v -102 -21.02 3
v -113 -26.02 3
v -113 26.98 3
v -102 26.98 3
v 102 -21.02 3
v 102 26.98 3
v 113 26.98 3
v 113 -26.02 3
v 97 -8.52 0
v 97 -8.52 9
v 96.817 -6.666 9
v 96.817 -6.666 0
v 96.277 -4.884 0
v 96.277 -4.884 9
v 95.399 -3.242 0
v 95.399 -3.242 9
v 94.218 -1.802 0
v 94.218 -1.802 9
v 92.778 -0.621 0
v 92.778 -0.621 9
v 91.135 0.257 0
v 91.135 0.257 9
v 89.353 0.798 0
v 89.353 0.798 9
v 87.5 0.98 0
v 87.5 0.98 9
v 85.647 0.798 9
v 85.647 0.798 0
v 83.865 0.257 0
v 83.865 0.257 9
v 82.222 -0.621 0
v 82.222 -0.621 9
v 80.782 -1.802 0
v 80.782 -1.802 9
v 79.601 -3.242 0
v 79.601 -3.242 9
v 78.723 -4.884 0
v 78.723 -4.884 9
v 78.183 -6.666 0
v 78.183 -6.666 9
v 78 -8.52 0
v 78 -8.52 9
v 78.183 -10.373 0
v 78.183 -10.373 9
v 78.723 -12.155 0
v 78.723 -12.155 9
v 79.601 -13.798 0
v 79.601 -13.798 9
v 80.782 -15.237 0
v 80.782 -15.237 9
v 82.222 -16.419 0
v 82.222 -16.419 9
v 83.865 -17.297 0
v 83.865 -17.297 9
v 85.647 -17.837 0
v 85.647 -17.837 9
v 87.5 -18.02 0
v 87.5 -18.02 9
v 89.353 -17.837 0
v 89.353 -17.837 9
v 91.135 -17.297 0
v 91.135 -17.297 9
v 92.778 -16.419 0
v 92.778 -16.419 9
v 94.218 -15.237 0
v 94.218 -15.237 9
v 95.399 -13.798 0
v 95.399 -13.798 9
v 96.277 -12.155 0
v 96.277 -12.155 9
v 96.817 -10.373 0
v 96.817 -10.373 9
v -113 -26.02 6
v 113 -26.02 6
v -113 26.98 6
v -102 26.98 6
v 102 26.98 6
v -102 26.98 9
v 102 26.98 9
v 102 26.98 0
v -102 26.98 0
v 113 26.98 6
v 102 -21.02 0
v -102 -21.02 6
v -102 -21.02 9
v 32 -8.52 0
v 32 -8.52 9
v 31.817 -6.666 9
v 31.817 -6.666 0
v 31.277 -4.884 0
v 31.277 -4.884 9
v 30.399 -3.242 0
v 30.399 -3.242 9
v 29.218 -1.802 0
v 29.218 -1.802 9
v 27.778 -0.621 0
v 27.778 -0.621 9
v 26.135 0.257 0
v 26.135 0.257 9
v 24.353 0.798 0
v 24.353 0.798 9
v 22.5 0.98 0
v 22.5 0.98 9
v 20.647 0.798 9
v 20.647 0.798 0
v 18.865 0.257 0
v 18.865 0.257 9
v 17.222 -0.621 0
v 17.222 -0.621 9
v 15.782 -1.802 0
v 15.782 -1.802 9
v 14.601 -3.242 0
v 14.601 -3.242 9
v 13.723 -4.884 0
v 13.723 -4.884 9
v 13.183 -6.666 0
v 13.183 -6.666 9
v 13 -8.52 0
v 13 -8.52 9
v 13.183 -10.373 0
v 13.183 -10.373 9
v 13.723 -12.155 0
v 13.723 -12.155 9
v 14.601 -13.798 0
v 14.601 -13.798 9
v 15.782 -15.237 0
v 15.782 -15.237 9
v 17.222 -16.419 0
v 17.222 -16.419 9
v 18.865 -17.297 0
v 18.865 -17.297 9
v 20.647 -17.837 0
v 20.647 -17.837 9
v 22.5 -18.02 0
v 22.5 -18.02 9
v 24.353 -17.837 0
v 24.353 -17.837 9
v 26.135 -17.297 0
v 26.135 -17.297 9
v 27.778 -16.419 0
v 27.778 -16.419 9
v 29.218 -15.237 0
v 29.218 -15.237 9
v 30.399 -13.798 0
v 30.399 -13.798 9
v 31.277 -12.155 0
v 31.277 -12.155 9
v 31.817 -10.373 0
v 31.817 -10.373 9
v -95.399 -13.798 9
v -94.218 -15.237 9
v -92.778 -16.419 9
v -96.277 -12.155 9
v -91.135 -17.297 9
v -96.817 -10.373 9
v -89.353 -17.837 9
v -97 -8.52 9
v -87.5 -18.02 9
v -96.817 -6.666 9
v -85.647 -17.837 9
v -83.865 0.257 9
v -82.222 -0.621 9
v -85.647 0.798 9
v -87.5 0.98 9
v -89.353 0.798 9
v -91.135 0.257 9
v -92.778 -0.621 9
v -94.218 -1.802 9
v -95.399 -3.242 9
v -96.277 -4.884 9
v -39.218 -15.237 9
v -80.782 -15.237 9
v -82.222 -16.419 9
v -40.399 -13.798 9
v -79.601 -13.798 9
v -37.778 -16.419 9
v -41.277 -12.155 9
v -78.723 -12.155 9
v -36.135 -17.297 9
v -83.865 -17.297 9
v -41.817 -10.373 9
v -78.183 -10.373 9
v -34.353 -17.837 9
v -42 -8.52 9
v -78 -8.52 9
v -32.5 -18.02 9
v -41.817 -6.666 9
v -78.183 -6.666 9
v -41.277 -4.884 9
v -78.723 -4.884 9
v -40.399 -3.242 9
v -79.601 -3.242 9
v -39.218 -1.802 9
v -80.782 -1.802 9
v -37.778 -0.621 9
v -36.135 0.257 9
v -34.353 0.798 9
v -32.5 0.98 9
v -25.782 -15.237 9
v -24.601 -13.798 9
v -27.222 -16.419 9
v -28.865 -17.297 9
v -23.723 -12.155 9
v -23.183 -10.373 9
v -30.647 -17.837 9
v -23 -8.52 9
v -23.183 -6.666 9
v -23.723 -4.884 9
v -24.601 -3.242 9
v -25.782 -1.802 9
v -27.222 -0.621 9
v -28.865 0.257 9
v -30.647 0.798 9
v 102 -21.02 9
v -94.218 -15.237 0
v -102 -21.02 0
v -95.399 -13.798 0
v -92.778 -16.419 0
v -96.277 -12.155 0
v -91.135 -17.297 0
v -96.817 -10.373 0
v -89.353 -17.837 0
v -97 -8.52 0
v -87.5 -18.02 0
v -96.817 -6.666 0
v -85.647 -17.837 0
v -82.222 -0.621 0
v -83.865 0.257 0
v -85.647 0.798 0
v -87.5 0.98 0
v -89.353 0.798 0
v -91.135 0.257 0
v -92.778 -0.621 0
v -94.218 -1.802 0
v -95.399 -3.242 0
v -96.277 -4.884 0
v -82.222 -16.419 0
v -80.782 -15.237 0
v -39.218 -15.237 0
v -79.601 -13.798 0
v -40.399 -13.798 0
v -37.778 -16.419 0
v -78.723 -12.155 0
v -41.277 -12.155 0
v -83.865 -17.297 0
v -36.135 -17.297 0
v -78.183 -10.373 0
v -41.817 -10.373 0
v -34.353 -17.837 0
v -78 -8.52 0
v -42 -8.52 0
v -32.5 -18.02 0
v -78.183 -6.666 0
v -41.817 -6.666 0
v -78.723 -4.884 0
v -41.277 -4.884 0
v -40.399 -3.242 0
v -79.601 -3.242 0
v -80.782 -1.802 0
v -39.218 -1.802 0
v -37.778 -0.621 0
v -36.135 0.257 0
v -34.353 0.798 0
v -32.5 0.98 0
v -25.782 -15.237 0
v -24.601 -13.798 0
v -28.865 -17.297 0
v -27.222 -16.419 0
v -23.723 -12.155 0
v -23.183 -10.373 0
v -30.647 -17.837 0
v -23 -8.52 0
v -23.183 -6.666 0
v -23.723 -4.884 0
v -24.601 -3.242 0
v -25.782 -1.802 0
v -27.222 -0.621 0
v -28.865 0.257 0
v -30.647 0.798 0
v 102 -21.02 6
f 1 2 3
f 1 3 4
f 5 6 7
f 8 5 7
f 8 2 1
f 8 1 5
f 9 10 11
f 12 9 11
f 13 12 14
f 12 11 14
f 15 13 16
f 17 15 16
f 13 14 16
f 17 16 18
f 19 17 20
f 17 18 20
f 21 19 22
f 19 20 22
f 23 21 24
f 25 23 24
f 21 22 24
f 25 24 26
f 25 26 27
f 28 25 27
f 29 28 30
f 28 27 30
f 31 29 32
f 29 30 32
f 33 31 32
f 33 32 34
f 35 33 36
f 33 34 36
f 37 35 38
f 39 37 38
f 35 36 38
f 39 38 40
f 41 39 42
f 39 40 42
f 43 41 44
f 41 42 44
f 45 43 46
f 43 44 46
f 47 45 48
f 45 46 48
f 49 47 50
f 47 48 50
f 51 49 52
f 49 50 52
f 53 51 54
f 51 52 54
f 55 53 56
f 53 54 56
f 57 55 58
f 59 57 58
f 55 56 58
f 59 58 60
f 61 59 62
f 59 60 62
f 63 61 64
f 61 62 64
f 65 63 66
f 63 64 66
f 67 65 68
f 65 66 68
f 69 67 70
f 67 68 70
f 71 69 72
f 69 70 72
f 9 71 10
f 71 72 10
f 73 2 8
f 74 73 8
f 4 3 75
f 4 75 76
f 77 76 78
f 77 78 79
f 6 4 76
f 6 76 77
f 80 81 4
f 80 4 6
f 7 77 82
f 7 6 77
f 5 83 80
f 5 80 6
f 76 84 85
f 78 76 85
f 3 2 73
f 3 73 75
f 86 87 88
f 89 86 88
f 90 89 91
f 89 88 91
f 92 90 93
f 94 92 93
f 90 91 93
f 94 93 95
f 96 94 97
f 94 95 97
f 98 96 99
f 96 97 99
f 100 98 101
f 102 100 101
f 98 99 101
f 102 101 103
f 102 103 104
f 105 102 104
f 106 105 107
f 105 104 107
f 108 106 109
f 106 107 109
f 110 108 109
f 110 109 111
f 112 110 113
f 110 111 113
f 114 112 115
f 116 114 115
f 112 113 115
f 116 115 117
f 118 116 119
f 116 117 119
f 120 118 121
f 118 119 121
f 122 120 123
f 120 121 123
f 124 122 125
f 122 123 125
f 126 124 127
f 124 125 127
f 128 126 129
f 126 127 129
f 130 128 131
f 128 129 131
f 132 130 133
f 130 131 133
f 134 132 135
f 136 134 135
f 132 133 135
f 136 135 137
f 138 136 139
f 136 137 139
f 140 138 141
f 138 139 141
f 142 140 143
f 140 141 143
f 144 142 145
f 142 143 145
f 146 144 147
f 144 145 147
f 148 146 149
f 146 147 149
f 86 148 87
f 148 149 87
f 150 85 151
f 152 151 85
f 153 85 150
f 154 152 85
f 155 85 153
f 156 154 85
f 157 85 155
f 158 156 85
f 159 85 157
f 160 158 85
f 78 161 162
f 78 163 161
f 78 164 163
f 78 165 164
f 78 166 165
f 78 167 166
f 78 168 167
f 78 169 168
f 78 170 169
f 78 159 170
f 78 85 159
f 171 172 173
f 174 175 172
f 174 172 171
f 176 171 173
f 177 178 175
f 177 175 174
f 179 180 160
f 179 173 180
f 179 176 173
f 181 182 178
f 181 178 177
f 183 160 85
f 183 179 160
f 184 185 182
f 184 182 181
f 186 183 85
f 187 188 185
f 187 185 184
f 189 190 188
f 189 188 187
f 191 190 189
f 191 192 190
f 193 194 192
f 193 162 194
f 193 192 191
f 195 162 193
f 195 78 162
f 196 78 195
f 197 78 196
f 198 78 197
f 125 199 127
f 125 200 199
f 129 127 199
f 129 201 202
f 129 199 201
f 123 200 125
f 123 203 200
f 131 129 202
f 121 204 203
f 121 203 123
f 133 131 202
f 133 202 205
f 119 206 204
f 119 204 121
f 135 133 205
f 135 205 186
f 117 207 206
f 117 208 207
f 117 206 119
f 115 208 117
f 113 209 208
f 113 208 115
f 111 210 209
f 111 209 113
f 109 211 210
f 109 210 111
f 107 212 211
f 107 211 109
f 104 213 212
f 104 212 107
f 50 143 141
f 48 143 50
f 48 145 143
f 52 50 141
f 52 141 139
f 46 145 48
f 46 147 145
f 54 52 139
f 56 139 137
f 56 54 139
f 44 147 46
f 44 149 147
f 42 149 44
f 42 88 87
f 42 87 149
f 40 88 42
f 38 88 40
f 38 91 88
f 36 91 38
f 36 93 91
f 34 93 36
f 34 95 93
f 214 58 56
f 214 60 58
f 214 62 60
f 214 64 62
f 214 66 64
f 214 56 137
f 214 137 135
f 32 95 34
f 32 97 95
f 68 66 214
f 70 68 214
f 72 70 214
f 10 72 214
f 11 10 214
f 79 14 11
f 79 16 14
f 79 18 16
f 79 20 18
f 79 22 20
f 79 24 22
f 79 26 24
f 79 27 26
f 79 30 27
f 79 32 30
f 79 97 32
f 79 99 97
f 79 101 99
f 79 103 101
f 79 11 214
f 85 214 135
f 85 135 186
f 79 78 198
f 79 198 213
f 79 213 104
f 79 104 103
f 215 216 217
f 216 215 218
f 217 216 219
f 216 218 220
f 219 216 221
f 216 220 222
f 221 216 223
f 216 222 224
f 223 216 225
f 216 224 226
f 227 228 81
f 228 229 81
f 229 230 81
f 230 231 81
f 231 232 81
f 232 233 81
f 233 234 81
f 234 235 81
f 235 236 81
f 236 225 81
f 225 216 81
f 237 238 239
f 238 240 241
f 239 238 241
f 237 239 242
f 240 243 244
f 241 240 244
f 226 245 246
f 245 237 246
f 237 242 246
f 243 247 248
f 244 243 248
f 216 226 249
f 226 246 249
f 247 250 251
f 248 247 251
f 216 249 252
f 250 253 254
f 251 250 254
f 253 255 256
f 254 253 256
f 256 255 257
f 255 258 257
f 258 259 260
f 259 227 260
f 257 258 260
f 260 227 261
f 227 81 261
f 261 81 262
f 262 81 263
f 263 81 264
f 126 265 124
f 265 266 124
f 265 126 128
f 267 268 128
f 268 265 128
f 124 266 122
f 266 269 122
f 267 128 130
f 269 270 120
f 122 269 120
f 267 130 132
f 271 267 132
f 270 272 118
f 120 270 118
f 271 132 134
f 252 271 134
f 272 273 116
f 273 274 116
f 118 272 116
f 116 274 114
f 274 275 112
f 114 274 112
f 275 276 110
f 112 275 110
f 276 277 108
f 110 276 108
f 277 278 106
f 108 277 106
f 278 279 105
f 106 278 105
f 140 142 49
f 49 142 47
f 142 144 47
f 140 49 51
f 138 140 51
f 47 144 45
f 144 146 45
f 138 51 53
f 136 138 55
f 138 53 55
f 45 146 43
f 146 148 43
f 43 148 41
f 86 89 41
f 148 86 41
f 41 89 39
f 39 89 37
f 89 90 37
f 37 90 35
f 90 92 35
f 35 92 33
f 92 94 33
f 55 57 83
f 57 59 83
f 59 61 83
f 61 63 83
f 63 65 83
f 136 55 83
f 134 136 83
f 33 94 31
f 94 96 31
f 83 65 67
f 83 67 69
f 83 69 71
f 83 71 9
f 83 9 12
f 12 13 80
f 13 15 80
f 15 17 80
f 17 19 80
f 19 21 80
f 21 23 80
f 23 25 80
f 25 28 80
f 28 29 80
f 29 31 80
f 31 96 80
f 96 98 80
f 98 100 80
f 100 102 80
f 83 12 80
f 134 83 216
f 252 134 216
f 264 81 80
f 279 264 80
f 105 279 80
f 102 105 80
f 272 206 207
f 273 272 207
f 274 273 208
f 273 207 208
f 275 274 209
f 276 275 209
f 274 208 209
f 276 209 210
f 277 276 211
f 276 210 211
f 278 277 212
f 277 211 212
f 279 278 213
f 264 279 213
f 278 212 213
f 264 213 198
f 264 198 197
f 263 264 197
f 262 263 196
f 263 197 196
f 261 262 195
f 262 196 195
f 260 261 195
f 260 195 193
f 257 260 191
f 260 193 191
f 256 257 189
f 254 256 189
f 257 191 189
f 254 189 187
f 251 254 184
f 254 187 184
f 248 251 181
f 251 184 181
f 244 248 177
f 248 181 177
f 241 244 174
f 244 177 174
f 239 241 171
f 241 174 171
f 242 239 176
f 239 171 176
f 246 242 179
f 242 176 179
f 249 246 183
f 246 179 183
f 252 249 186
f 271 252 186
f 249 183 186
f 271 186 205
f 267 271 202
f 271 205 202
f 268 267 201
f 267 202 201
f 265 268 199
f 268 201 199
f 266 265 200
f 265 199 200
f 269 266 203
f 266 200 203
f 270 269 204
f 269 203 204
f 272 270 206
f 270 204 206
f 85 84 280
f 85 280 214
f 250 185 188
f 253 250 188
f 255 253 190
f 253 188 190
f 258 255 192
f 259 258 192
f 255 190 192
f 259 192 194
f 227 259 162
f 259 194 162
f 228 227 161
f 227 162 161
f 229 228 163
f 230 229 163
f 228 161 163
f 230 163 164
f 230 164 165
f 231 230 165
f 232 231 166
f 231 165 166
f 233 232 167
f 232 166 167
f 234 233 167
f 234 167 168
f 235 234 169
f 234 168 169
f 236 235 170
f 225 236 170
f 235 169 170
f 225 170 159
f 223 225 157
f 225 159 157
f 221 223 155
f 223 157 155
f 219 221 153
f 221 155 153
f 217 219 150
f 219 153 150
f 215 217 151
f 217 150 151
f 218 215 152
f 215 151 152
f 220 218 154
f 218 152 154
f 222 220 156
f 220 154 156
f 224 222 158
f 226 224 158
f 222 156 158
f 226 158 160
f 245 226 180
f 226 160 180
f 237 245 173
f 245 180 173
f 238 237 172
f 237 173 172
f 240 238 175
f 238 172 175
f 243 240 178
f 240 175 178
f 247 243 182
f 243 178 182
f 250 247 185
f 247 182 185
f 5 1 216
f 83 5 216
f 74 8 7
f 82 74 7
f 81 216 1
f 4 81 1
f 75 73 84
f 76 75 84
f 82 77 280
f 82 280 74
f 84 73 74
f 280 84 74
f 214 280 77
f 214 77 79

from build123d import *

# Parameters (mm, degrees)
SKETCH1_W           = 226
SKETCH1_H           = 53
BOSS_EXTRUDE1_DEPTH = 9
SKETCH3_R           = 9.5
CUT_EXTRUDE1_DEPTH  = 9
SKETCH2_W           = 11
SKETCH2_H           = 3
CUT_EXTRUDE2_DEPTH  = 54
SKETCH4_W           = 3
SKETCH4_H           = 5
CUT_EXTRUDE3_DEPTH  = 227


with BuildPart() as part:
    # Sketch1 → Boss-Extrude1 (new body)
    with BuildSketch(Plane.XY):
        with Locations((0, 0.4802203)):
            Rectangle(SKETCH1_W, SKETCH1_H)
    extrude(amount=BOSS_EXTRUDE1_DEPTH)

    # Sketch3 → Cut-Extrude1 (cut)
    with BuildSketch(Plane.XY.offset(9)):
        with Locations((-87.5, -8.5197797)):
            Circle(SKETCH3_R)
        with Locations((-32.5, -8.5197797)):
            Circle(SKETCH3_R)
        with Locations((22.5, -8.5197797)):
            Circle(SKETCH3_R)
        with Locations((87.5, -8.5197797)):
            Circle(SKETCH3_R)
    extrude(amount=-CUT_EXTRUDE1_DEPTH, mode=Mode.SUBTRACT)

    # Sketch2 → Cut-Extrude2 (cut, through all)
    with BuildSketch(Plane.XZ.offset(26.0197797)):
        with Locations((-107.5, 7.5)):
            Rectangle(SKETCH2_W, SKETCH2_H)
        with Locations((-107.5, 1.5)):
            Rectangle(SKETCH2_W, SKETCH2_H)
        with Locations((107.5, 7.5)):
            Rectangle(SKETCH2_W, SKETCH2_H)
        with Locations((107.5, 1.5)):
            Rectangle(SKETCH2_W, SKETCH2_H)
    extrude(amount=-CUT_EXTRUDE2_DEPTH, mode=Mode.SUBTRACT)

    # Sketch4 → Cut-Extrude3 (cut, through all)
    with BuildSketch(Plane.ZY.offset(113)):
        Polygon((0, -21.0197797), (0, -26.0197797), (3, -26.0197797), (3, -23.123504735), (3, -21.0197797), align=None)
        with Locations((7.5, -23.5197797)):
            Rectangle(SKETCH4_W, SKETCH4_H)
    extrude(amount=-CUT_EXTRUDE3_DEPTH, mode=Mode.SUBTRACT)


solid = part.part
